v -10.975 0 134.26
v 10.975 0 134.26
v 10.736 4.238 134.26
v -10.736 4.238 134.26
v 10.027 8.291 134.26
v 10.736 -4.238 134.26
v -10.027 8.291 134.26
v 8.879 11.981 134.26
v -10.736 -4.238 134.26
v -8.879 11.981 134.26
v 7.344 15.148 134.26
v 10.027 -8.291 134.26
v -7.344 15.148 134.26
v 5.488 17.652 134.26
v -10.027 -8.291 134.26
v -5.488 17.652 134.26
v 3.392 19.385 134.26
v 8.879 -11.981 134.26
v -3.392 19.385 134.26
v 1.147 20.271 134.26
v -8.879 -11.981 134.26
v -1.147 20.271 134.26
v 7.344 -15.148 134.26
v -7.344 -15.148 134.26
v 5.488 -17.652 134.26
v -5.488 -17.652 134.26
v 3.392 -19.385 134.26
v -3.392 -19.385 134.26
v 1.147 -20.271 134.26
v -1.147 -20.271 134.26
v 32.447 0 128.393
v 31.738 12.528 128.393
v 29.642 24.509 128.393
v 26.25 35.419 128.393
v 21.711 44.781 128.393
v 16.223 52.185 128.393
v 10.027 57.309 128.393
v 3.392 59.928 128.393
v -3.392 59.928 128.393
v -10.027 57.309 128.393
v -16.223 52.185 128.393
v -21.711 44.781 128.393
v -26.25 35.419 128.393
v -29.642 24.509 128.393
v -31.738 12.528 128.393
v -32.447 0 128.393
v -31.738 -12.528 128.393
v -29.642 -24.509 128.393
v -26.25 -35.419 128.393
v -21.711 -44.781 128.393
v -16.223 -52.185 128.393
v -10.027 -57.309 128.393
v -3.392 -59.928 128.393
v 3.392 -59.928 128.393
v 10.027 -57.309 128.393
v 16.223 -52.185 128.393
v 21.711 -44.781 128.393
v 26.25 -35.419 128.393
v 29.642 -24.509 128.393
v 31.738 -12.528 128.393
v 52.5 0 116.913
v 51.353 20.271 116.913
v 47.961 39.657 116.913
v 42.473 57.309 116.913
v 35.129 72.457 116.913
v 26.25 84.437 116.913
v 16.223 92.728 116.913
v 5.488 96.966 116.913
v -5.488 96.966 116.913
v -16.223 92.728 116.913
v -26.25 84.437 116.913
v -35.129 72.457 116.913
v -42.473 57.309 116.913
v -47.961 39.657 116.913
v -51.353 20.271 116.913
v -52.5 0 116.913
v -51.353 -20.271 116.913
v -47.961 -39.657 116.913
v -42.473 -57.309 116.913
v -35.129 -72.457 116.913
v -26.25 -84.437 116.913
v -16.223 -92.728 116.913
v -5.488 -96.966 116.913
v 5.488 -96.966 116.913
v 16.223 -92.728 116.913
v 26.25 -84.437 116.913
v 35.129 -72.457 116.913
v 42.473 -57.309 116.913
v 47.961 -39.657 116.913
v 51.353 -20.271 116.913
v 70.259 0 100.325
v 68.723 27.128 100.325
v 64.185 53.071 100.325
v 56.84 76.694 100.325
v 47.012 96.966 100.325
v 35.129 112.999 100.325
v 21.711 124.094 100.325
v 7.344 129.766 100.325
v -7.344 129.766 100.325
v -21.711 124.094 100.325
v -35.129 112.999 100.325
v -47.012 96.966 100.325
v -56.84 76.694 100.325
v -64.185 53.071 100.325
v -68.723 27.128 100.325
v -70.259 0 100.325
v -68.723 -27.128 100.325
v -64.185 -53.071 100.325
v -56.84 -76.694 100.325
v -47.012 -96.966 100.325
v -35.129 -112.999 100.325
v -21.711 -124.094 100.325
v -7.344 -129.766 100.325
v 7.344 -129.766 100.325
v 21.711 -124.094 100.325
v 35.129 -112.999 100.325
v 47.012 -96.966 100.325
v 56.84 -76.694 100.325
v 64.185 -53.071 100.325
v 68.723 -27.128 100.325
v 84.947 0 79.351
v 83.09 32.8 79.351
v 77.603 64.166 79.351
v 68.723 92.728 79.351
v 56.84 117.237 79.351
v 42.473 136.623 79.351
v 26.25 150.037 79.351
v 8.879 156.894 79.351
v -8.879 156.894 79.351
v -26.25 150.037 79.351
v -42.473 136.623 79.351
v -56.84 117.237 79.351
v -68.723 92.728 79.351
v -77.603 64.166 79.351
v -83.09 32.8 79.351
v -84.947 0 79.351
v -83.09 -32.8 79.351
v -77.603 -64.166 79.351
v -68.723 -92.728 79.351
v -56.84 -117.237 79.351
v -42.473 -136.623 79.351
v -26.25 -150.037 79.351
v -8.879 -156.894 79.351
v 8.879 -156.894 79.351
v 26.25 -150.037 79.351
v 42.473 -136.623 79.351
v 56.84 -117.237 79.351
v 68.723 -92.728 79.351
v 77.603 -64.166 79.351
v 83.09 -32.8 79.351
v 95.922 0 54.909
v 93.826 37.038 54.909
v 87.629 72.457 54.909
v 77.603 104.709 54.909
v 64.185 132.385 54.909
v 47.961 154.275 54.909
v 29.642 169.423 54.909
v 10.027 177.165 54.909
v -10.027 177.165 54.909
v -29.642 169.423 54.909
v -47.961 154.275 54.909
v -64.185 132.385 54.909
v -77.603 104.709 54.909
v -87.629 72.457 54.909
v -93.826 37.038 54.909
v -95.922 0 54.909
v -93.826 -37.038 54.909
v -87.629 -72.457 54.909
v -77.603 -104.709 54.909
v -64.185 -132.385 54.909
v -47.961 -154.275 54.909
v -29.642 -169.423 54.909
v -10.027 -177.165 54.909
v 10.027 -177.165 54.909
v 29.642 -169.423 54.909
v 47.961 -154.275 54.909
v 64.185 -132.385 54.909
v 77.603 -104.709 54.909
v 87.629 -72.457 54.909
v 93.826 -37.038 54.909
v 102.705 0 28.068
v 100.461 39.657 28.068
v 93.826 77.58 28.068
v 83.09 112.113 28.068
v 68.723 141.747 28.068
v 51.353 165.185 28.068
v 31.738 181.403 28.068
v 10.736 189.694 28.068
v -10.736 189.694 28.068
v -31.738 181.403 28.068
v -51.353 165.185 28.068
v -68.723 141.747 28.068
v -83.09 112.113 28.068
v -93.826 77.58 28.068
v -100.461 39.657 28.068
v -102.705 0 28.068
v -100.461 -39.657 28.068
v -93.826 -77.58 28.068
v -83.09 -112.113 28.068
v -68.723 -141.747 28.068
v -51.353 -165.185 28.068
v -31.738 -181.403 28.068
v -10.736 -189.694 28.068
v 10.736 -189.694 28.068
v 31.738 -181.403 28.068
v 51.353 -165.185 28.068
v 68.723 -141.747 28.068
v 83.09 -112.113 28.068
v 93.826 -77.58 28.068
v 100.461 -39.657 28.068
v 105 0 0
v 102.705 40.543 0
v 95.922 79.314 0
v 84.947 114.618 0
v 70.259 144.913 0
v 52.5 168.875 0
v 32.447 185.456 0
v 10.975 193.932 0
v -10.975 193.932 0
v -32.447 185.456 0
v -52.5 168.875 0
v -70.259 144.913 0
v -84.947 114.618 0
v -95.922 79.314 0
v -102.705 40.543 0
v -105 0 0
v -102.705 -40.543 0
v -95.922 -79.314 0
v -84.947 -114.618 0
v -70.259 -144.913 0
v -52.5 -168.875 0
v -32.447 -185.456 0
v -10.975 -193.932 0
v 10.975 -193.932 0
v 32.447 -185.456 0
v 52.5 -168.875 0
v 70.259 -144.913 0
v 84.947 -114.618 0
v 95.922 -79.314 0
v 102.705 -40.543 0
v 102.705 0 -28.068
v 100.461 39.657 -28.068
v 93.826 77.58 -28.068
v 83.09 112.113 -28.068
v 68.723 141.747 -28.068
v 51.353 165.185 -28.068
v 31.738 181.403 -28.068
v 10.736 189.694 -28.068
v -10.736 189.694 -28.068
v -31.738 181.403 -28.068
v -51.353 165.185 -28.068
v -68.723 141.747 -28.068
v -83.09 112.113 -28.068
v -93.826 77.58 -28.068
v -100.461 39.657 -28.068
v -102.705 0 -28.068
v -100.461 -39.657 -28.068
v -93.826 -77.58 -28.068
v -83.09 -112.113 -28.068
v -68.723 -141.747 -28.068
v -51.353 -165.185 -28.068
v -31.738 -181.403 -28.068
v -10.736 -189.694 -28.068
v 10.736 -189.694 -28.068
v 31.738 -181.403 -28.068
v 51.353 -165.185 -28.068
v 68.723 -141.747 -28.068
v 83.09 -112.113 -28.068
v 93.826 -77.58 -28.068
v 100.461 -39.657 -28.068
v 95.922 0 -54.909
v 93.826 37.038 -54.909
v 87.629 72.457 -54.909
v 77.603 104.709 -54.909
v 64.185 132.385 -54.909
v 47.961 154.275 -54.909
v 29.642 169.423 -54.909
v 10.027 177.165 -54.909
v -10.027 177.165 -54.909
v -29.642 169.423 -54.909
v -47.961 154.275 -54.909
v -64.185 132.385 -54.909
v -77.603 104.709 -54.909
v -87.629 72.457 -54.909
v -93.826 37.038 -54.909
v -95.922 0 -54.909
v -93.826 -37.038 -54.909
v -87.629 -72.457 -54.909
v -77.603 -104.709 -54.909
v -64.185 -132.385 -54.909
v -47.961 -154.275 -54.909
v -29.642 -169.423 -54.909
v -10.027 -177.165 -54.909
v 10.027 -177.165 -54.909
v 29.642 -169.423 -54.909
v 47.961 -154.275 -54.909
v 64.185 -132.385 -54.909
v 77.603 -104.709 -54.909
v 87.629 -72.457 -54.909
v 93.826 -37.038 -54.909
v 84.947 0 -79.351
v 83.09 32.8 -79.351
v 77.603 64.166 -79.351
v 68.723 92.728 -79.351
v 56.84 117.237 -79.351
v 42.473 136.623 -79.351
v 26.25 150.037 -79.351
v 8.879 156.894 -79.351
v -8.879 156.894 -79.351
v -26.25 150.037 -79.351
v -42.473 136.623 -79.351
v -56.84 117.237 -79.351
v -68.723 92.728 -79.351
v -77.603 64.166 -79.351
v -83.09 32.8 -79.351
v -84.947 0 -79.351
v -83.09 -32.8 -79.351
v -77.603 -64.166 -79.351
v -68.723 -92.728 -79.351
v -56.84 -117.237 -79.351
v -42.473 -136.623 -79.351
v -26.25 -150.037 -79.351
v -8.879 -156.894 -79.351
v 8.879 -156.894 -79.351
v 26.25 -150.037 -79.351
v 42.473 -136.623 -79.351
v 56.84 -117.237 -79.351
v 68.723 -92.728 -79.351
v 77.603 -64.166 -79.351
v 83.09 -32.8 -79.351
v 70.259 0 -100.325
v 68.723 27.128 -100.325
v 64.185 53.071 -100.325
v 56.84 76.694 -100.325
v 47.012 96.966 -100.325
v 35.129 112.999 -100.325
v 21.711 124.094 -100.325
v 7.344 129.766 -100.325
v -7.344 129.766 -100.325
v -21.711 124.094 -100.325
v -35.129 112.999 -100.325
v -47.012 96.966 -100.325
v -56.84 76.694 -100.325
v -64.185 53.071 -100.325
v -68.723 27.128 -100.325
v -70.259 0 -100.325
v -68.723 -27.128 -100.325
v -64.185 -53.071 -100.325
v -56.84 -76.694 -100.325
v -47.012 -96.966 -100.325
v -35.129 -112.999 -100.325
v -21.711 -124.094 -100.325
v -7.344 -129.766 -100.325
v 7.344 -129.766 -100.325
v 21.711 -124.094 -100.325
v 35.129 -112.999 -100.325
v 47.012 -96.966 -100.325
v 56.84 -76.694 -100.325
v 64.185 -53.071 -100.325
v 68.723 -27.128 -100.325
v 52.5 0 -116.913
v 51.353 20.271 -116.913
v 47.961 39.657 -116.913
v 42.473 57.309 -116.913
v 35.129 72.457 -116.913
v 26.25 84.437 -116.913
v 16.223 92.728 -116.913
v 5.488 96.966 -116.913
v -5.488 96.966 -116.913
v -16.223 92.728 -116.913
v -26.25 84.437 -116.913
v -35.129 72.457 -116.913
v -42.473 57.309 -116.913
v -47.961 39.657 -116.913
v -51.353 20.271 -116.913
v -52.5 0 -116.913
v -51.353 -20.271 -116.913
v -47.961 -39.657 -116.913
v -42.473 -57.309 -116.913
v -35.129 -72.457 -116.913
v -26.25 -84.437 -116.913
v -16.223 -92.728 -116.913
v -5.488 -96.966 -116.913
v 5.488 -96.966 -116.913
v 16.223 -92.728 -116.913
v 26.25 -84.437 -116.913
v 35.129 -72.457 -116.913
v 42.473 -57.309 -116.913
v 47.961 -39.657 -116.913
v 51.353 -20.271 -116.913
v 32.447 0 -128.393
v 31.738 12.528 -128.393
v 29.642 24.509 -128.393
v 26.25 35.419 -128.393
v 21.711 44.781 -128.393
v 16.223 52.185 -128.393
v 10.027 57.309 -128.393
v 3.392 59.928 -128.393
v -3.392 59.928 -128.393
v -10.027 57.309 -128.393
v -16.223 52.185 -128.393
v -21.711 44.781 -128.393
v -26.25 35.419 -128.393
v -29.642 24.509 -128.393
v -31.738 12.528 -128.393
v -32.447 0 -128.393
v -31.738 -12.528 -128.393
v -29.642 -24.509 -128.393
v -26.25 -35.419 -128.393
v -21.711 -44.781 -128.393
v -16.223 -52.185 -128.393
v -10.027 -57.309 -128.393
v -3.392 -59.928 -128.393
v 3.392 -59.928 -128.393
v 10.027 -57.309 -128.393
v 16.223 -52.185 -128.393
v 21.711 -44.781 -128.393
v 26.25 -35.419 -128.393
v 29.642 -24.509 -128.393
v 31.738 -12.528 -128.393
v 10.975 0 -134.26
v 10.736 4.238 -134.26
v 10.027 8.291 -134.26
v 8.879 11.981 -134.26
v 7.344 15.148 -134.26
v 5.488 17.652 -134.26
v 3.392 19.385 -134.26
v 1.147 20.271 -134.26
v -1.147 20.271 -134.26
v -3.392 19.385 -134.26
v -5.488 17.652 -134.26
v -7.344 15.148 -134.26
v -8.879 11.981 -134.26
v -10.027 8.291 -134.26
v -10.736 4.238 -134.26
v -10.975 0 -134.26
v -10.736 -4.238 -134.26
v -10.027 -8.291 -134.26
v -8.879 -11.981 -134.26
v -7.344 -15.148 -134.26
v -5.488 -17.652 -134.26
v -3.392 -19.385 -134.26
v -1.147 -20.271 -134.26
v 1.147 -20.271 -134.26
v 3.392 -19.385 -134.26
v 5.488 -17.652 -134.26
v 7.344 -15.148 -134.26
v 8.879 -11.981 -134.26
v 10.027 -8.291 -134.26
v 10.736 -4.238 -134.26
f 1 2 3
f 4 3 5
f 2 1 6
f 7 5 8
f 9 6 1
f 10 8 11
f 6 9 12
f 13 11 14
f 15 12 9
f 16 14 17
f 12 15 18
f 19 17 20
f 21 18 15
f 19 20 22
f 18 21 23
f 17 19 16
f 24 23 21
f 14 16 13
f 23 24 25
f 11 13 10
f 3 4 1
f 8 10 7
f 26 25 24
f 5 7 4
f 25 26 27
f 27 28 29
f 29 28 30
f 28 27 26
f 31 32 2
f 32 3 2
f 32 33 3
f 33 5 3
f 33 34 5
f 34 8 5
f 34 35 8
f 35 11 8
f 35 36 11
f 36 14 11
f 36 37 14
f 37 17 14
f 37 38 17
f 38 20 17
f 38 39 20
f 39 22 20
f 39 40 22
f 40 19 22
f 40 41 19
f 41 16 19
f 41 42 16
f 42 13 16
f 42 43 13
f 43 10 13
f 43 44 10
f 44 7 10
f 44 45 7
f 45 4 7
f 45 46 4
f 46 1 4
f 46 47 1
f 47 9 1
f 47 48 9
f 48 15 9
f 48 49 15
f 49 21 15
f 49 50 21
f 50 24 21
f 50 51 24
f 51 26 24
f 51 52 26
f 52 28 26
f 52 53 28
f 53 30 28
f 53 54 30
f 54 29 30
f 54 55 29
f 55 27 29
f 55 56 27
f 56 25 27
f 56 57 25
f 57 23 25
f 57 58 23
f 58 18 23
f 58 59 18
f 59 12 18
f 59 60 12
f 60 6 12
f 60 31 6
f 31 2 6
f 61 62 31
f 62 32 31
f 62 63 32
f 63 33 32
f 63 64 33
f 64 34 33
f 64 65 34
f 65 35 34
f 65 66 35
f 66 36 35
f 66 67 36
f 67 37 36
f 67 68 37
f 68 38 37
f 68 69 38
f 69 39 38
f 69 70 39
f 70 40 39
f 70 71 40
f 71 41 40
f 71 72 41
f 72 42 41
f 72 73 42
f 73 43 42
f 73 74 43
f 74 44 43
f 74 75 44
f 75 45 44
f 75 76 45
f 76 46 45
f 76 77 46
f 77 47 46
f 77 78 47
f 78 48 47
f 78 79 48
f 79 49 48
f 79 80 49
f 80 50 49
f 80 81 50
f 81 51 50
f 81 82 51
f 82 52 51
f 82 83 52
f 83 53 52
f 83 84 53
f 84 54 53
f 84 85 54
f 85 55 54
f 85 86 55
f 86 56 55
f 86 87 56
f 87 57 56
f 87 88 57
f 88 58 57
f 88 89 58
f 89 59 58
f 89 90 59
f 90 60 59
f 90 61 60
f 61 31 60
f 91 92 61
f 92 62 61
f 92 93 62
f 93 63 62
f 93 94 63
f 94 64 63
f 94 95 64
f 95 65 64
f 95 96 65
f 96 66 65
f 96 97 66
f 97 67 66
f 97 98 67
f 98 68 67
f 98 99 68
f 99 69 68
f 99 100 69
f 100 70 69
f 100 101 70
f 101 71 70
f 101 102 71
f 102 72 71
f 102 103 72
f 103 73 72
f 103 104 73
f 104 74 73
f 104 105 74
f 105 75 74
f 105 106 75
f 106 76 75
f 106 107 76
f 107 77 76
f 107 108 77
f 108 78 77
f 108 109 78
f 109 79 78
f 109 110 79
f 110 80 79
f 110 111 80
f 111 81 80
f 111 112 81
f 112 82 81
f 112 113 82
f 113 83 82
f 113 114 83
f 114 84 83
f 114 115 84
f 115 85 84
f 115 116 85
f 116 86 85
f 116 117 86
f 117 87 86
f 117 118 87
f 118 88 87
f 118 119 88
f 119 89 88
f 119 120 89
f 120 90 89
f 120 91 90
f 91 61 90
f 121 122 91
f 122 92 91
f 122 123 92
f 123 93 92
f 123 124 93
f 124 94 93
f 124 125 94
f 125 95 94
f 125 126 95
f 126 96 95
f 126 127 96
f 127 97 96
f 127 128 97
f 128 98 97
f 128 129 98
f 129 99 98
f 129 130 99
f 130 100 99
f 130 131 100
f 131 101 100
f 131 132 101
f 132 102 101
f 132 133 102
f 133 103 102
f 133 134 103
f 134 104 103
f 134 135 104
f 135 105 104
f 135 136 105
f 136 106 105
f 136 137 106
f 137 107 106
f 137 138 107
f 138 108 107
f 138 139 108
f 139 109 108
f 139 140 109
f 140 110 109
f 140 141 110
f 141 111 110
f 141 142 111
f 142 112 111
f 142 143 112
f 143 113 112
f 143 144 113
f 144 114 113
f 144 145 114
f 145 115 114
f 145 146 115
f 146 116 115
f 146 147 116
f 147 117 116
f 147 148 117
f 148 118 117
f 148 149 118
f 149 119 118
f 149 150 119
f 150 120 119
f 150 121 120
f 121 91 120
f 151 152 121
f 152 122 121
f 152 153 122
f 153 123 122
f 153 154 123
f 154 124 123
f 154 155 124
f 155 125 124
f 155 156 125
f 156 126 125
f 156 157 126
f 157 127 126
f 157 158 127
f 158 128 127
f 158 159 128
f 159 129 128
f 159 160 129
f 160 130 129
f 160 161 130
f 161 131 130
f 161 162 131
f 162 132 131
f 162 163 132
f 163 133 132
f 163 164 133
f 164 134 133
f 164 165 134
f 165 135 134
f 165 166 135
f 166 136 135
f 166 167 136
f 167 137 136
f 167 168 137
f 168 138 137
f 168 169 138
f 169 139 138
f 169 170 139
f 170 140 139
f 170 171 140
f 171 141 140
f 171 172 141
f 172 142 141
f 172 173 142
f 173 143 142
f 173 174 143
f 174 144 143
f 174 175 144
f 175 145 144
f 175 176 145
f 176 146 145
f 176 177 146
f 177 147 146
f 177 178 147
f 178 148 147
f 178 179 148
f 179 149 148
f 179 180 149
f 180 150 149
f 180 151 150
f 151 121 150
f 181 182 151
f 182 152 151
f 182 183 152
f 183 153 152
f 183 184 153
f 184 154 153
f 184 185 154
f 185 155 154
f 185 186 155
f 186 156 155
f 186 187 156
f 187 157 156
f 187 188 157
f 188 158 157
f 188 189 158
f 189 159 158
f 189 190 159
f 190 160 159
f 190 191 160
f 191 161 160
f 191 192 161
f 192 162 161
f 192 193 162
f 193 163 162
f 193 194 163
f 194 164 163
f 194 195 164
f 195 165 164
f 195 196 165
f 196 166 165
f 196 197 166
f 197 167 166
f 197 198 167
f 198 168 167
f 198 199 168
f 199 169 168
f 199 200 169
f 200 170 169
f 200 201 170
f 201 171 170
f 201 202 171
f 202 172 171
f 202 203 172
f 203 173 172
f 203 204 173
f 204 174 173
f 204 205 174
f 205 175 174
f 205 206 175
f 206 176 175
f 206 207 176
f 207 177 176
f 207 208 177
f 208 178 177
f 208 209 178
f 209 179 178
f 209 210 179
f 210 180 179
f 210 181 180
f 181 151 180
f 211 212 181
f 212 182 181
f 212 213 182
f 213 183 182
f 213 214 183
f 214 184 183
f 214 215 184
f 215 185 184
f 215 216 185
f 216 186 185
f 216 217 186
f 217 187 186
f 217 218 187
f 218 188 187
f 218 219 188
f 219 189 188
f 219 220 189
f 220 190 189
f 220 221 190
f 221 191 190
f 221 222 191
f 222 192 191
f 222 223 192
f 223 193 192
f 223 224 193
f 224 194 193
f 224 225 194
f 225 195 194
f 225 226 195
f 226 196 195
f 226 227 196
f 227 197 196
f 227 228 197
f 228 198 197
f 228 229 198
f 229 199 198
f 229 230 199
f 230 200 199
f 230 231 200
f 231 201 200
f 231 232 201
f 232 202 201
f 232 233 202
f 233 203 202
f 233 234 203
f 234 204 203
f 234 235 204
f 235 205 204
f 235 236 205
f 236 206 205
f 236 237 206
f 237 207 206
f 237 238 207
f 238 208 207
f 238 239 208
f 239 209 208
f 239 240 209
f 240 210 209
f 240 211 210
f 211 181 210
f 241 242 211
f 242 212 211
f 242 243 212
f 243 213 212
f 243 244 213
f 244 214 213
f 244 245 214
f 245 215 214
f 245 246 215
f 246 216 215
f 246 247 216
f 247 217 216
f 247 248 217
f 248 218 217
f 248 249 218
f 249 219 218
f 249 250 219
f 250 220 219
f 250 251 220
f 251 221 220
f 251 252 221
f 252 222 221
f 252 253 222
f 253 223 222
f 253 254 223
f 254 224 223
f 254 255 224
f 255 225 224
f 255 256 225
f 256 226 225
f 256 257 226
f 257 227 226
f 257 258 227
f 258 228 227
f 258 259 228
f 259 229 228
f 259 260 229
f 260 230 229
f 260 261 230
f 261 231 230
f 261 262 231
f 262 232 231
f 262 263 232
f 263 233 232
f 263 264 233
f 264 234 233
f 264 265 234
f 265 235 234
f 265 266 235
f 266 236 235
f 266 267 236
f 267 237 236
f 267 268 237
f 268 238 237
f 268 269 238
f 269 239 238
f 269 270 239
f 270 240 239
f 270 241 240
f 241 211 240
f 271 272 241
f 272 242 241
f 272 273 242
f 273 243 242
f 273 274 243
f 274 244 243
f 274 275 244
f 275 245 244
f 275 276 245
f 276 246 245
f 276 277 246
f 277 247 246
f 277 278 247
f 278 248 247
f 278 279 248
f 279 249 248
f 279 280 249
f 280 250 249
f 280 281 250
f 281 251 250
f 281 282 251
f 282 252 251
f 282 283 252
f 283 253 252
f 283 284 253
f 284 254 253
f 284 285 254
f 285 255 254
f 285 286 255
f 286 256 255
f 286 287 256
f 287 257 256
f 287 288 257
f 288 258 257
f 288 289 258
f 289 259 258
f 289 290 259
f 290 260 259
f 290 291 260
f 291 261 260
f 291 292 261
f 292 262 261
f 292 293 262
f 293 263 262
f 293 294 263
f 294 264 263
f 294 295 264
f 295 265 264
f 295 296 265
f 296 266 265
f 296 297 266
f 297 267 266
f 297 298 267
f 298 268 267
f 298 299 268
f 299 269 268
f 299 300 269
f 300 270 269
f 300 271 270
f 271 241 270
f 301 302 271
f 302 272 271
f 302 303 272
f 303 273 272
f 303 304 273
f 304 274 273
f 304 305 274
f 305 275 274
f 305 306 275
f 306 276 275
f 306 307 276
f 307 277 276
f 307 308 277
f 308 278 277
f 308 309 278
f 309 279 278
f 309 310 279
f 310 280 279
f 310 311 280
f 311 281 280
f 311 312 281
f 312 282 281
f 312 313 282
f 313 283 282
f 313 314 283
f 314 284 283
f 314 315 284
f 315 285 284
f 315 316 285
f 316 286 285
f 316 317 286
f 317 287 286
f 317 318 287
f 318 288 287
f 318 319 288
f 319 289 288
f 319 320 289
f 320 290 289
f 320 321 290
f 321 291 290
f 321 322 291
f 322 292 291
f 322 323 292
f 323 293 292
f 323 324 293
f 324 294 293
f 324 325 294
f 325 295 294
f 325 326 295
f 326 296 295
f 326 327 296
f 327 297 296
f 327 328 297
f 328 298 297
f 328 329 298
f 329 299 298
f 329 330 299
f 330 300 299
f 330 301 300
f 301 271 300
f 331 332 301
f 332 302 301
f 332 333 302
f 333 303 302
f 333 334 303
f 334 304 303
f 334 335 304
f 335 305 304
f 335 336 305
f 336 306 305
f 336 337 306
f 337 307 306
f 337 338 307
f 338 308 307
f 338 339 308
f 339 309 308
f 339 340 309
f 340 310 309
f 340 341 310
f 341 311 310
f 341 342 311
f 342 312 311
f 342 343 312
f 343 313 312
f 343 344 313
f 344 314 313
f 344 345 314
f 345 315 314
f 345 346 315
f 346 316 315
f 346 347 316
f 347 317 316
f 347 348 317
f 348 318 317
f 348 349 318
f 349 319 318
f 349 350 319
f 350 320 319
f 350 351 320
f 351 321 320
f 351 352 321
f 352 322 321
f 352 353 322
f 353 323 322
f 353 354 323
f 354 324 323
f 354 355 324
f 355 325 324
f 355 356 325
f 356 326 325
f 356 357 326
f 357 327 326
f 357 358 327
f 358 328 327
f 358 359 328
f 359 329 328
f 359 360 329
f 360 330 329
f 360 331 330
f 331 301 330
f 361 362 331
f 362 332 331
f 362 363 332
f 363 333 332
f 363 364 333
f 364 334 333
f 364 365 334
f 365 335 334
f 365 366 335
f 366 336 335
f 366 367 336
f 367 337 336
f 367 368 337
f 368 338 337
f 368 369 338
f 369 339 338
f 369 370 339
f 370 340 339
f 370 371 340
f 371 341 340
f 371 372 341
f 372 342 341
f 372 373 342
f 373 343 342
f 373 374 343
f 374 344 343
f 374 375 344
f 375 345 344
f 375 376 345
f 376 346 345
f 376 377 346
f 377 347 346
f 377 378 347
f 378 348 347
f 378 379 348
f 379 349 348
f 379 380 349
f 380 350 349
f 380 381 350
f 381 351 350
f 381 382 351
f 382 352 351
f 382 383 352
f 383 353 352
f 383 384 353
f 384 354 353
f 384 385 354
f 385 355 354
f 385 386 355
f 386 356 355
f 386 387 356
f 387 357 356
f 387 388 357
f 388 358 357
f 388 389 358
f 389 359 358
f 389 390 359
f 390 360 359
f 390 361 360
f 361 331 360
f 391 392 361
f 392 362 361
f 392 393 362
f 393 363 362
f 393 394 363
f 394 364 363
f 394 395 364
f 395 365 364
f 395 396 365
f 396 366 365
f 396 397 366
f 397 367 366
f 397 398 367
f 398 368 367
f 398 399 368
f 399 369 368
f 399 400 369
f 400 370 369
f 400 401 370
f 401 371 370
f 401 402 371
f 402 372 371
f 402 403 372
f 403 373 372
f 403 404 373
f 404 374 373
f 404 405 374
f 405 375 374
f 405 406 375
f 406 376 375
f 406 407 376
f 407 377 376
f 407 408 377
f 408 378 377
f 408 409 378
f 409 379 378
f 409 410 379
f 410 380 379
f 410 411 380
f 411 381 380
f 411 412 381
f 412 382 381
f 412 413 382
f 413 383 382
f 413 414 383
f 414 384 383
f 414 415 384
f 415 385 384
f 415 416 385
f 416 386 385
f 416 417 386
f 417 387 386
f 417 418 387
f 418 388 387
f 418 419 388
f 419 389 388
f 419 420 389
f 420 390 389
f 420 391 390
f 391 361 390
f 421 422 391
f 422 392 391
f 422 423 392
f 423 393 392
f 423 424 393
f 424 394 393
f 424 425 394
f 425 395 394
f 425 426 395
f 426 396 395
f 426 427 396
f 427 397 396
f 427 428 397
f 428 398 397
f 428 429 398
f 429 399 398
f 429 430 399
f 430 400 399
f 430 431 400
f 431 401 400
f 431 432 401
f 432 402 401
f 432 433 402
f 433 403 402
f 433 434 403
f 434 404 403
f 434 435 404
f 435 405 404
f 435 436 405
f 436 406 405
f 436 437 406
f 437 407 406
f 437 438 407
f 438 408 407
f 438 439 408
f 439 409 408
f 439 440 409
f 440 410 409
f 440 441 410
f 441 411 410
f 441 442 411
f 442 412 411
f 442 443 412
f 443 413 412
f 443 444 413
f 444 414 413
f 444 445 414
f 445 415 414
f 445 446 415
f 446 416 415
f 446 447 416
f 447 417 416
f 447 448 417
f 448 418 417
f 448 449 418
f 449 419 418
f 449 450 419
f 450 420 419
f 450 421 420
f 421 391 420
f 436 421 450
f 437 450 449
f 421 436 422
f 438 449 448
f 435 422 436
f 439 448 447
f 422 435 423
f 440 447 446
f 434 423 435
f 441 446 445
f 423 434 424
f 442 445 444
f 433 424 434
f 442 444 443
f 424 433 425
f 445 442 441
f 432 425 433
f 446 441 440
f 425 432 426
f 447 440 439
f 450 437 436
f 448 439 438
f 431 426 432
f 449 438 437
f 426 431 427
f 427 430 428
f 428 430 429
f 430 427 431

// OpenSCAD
// Generated by SolidPython 1.0.1 on 2020-07-29 00:46:47


scale(v = [7, 13, 9]) {
	sphere(r = 15);
}
/***********************************************
*********      SolidPython code:      **********
************************************************
 
# import packages: SolidPython
from solid import *
from solid.utils import *
from itertools import chain, combinations, permutations


class Resize:

    def __init__(self, scad_file):
        self.scad_file = scad_file
        #self.scad_file = import_scad(scad_file)
        # cone/cylinder param:
        self.r1 = 0
        self.r2 = 0
        self.h = 0
        # rectangular prism param:
        self.w = 0
        self.l = 0
        # ellipse param:
        self.r = 0

    # import OpenScad code (file name corresponds to shape)


    # classify shape + parameters
    def assign(self, param1, param2, param3):
        if self.scad_file == 'cone.scad':
            self.r1 = param1
            self.r2 = param2
            self.h = param3
        elif self.scad_file == 'cylinder.scad':
            self.r1 = param1
            self.r2 = param2
            self.h = param3
        elif self.scad_file == 'rectangularPrism.scad':
            self.h = param1
            self.l = param2
            self.w = param3
        else:
            self.r = param1
            self.h = param2

    # resize parameters
    def iterate(self):
        x = range(3, 20, 2)
        i = 1
        if self.scad_file == 'cone.scad':
            tempList = list(permutations(x, 2))
            for temp in tempList:
                param1 = temp[0]
                param2 = temp[1]
                filepath = 'produced_scad_files/' + 'cone' + str(param1) + '_' + str(param2) + '_' + '.scad'
                scad_render_to_file(cylinder(h=param1, r1=param2, r2=0), filepath)

        elif self.scad_file == 'cylinder.scad':
            tempList = list(permutations(x, 3))
            for temp in tempList:
                param1 = temp[0]
                param2 = temp[1]
                filepath = 'produced_scad_files/' + 'cylinder' + str(param1) + '_' + str(param2) + '_' + '.scad'
                scad_render_to_file(cylinder(h=param1, r1=param2, r2=param2), filepath)

        elif self.scad_file == 'rectangularPrism.scad':
            tempList = list(permutations(x, 3))
            for temp in tempList:
                param1 = temp[0]
                param2 = temp[1]
                param3 = temp[2]
                filepath = 'produced_scad_files/' + 'rectangularPrism' + str(param1) + '_' + str(param2) + '_' + str(
                    param3) + '.scad'
                scad_render_to_file(cube(size=(param1, param2, param3)), filepath)

        elif self.scad_file == 'ellipse.scad':
            tempList = list(permutations(x, 4))
            for temp in tempList:
                param1 = temp[0]
                param2 = temp[1]
                param3 = temp[2]
                param4 = temp[3]
                filepath = 'produced_scad_files/' + 'ellipse' + str(param1) + '_' + str(param2) + '_' + str(param3) + '_' + str(param4) + '.scad'
                scad_render_to_file(scale([param1, param2, param3])(sphere(r=param4)), filepath)

    def render_to_scadfile(self):
        scad_render_to_file(scad, 'example.scad') 
 
************************************************/
